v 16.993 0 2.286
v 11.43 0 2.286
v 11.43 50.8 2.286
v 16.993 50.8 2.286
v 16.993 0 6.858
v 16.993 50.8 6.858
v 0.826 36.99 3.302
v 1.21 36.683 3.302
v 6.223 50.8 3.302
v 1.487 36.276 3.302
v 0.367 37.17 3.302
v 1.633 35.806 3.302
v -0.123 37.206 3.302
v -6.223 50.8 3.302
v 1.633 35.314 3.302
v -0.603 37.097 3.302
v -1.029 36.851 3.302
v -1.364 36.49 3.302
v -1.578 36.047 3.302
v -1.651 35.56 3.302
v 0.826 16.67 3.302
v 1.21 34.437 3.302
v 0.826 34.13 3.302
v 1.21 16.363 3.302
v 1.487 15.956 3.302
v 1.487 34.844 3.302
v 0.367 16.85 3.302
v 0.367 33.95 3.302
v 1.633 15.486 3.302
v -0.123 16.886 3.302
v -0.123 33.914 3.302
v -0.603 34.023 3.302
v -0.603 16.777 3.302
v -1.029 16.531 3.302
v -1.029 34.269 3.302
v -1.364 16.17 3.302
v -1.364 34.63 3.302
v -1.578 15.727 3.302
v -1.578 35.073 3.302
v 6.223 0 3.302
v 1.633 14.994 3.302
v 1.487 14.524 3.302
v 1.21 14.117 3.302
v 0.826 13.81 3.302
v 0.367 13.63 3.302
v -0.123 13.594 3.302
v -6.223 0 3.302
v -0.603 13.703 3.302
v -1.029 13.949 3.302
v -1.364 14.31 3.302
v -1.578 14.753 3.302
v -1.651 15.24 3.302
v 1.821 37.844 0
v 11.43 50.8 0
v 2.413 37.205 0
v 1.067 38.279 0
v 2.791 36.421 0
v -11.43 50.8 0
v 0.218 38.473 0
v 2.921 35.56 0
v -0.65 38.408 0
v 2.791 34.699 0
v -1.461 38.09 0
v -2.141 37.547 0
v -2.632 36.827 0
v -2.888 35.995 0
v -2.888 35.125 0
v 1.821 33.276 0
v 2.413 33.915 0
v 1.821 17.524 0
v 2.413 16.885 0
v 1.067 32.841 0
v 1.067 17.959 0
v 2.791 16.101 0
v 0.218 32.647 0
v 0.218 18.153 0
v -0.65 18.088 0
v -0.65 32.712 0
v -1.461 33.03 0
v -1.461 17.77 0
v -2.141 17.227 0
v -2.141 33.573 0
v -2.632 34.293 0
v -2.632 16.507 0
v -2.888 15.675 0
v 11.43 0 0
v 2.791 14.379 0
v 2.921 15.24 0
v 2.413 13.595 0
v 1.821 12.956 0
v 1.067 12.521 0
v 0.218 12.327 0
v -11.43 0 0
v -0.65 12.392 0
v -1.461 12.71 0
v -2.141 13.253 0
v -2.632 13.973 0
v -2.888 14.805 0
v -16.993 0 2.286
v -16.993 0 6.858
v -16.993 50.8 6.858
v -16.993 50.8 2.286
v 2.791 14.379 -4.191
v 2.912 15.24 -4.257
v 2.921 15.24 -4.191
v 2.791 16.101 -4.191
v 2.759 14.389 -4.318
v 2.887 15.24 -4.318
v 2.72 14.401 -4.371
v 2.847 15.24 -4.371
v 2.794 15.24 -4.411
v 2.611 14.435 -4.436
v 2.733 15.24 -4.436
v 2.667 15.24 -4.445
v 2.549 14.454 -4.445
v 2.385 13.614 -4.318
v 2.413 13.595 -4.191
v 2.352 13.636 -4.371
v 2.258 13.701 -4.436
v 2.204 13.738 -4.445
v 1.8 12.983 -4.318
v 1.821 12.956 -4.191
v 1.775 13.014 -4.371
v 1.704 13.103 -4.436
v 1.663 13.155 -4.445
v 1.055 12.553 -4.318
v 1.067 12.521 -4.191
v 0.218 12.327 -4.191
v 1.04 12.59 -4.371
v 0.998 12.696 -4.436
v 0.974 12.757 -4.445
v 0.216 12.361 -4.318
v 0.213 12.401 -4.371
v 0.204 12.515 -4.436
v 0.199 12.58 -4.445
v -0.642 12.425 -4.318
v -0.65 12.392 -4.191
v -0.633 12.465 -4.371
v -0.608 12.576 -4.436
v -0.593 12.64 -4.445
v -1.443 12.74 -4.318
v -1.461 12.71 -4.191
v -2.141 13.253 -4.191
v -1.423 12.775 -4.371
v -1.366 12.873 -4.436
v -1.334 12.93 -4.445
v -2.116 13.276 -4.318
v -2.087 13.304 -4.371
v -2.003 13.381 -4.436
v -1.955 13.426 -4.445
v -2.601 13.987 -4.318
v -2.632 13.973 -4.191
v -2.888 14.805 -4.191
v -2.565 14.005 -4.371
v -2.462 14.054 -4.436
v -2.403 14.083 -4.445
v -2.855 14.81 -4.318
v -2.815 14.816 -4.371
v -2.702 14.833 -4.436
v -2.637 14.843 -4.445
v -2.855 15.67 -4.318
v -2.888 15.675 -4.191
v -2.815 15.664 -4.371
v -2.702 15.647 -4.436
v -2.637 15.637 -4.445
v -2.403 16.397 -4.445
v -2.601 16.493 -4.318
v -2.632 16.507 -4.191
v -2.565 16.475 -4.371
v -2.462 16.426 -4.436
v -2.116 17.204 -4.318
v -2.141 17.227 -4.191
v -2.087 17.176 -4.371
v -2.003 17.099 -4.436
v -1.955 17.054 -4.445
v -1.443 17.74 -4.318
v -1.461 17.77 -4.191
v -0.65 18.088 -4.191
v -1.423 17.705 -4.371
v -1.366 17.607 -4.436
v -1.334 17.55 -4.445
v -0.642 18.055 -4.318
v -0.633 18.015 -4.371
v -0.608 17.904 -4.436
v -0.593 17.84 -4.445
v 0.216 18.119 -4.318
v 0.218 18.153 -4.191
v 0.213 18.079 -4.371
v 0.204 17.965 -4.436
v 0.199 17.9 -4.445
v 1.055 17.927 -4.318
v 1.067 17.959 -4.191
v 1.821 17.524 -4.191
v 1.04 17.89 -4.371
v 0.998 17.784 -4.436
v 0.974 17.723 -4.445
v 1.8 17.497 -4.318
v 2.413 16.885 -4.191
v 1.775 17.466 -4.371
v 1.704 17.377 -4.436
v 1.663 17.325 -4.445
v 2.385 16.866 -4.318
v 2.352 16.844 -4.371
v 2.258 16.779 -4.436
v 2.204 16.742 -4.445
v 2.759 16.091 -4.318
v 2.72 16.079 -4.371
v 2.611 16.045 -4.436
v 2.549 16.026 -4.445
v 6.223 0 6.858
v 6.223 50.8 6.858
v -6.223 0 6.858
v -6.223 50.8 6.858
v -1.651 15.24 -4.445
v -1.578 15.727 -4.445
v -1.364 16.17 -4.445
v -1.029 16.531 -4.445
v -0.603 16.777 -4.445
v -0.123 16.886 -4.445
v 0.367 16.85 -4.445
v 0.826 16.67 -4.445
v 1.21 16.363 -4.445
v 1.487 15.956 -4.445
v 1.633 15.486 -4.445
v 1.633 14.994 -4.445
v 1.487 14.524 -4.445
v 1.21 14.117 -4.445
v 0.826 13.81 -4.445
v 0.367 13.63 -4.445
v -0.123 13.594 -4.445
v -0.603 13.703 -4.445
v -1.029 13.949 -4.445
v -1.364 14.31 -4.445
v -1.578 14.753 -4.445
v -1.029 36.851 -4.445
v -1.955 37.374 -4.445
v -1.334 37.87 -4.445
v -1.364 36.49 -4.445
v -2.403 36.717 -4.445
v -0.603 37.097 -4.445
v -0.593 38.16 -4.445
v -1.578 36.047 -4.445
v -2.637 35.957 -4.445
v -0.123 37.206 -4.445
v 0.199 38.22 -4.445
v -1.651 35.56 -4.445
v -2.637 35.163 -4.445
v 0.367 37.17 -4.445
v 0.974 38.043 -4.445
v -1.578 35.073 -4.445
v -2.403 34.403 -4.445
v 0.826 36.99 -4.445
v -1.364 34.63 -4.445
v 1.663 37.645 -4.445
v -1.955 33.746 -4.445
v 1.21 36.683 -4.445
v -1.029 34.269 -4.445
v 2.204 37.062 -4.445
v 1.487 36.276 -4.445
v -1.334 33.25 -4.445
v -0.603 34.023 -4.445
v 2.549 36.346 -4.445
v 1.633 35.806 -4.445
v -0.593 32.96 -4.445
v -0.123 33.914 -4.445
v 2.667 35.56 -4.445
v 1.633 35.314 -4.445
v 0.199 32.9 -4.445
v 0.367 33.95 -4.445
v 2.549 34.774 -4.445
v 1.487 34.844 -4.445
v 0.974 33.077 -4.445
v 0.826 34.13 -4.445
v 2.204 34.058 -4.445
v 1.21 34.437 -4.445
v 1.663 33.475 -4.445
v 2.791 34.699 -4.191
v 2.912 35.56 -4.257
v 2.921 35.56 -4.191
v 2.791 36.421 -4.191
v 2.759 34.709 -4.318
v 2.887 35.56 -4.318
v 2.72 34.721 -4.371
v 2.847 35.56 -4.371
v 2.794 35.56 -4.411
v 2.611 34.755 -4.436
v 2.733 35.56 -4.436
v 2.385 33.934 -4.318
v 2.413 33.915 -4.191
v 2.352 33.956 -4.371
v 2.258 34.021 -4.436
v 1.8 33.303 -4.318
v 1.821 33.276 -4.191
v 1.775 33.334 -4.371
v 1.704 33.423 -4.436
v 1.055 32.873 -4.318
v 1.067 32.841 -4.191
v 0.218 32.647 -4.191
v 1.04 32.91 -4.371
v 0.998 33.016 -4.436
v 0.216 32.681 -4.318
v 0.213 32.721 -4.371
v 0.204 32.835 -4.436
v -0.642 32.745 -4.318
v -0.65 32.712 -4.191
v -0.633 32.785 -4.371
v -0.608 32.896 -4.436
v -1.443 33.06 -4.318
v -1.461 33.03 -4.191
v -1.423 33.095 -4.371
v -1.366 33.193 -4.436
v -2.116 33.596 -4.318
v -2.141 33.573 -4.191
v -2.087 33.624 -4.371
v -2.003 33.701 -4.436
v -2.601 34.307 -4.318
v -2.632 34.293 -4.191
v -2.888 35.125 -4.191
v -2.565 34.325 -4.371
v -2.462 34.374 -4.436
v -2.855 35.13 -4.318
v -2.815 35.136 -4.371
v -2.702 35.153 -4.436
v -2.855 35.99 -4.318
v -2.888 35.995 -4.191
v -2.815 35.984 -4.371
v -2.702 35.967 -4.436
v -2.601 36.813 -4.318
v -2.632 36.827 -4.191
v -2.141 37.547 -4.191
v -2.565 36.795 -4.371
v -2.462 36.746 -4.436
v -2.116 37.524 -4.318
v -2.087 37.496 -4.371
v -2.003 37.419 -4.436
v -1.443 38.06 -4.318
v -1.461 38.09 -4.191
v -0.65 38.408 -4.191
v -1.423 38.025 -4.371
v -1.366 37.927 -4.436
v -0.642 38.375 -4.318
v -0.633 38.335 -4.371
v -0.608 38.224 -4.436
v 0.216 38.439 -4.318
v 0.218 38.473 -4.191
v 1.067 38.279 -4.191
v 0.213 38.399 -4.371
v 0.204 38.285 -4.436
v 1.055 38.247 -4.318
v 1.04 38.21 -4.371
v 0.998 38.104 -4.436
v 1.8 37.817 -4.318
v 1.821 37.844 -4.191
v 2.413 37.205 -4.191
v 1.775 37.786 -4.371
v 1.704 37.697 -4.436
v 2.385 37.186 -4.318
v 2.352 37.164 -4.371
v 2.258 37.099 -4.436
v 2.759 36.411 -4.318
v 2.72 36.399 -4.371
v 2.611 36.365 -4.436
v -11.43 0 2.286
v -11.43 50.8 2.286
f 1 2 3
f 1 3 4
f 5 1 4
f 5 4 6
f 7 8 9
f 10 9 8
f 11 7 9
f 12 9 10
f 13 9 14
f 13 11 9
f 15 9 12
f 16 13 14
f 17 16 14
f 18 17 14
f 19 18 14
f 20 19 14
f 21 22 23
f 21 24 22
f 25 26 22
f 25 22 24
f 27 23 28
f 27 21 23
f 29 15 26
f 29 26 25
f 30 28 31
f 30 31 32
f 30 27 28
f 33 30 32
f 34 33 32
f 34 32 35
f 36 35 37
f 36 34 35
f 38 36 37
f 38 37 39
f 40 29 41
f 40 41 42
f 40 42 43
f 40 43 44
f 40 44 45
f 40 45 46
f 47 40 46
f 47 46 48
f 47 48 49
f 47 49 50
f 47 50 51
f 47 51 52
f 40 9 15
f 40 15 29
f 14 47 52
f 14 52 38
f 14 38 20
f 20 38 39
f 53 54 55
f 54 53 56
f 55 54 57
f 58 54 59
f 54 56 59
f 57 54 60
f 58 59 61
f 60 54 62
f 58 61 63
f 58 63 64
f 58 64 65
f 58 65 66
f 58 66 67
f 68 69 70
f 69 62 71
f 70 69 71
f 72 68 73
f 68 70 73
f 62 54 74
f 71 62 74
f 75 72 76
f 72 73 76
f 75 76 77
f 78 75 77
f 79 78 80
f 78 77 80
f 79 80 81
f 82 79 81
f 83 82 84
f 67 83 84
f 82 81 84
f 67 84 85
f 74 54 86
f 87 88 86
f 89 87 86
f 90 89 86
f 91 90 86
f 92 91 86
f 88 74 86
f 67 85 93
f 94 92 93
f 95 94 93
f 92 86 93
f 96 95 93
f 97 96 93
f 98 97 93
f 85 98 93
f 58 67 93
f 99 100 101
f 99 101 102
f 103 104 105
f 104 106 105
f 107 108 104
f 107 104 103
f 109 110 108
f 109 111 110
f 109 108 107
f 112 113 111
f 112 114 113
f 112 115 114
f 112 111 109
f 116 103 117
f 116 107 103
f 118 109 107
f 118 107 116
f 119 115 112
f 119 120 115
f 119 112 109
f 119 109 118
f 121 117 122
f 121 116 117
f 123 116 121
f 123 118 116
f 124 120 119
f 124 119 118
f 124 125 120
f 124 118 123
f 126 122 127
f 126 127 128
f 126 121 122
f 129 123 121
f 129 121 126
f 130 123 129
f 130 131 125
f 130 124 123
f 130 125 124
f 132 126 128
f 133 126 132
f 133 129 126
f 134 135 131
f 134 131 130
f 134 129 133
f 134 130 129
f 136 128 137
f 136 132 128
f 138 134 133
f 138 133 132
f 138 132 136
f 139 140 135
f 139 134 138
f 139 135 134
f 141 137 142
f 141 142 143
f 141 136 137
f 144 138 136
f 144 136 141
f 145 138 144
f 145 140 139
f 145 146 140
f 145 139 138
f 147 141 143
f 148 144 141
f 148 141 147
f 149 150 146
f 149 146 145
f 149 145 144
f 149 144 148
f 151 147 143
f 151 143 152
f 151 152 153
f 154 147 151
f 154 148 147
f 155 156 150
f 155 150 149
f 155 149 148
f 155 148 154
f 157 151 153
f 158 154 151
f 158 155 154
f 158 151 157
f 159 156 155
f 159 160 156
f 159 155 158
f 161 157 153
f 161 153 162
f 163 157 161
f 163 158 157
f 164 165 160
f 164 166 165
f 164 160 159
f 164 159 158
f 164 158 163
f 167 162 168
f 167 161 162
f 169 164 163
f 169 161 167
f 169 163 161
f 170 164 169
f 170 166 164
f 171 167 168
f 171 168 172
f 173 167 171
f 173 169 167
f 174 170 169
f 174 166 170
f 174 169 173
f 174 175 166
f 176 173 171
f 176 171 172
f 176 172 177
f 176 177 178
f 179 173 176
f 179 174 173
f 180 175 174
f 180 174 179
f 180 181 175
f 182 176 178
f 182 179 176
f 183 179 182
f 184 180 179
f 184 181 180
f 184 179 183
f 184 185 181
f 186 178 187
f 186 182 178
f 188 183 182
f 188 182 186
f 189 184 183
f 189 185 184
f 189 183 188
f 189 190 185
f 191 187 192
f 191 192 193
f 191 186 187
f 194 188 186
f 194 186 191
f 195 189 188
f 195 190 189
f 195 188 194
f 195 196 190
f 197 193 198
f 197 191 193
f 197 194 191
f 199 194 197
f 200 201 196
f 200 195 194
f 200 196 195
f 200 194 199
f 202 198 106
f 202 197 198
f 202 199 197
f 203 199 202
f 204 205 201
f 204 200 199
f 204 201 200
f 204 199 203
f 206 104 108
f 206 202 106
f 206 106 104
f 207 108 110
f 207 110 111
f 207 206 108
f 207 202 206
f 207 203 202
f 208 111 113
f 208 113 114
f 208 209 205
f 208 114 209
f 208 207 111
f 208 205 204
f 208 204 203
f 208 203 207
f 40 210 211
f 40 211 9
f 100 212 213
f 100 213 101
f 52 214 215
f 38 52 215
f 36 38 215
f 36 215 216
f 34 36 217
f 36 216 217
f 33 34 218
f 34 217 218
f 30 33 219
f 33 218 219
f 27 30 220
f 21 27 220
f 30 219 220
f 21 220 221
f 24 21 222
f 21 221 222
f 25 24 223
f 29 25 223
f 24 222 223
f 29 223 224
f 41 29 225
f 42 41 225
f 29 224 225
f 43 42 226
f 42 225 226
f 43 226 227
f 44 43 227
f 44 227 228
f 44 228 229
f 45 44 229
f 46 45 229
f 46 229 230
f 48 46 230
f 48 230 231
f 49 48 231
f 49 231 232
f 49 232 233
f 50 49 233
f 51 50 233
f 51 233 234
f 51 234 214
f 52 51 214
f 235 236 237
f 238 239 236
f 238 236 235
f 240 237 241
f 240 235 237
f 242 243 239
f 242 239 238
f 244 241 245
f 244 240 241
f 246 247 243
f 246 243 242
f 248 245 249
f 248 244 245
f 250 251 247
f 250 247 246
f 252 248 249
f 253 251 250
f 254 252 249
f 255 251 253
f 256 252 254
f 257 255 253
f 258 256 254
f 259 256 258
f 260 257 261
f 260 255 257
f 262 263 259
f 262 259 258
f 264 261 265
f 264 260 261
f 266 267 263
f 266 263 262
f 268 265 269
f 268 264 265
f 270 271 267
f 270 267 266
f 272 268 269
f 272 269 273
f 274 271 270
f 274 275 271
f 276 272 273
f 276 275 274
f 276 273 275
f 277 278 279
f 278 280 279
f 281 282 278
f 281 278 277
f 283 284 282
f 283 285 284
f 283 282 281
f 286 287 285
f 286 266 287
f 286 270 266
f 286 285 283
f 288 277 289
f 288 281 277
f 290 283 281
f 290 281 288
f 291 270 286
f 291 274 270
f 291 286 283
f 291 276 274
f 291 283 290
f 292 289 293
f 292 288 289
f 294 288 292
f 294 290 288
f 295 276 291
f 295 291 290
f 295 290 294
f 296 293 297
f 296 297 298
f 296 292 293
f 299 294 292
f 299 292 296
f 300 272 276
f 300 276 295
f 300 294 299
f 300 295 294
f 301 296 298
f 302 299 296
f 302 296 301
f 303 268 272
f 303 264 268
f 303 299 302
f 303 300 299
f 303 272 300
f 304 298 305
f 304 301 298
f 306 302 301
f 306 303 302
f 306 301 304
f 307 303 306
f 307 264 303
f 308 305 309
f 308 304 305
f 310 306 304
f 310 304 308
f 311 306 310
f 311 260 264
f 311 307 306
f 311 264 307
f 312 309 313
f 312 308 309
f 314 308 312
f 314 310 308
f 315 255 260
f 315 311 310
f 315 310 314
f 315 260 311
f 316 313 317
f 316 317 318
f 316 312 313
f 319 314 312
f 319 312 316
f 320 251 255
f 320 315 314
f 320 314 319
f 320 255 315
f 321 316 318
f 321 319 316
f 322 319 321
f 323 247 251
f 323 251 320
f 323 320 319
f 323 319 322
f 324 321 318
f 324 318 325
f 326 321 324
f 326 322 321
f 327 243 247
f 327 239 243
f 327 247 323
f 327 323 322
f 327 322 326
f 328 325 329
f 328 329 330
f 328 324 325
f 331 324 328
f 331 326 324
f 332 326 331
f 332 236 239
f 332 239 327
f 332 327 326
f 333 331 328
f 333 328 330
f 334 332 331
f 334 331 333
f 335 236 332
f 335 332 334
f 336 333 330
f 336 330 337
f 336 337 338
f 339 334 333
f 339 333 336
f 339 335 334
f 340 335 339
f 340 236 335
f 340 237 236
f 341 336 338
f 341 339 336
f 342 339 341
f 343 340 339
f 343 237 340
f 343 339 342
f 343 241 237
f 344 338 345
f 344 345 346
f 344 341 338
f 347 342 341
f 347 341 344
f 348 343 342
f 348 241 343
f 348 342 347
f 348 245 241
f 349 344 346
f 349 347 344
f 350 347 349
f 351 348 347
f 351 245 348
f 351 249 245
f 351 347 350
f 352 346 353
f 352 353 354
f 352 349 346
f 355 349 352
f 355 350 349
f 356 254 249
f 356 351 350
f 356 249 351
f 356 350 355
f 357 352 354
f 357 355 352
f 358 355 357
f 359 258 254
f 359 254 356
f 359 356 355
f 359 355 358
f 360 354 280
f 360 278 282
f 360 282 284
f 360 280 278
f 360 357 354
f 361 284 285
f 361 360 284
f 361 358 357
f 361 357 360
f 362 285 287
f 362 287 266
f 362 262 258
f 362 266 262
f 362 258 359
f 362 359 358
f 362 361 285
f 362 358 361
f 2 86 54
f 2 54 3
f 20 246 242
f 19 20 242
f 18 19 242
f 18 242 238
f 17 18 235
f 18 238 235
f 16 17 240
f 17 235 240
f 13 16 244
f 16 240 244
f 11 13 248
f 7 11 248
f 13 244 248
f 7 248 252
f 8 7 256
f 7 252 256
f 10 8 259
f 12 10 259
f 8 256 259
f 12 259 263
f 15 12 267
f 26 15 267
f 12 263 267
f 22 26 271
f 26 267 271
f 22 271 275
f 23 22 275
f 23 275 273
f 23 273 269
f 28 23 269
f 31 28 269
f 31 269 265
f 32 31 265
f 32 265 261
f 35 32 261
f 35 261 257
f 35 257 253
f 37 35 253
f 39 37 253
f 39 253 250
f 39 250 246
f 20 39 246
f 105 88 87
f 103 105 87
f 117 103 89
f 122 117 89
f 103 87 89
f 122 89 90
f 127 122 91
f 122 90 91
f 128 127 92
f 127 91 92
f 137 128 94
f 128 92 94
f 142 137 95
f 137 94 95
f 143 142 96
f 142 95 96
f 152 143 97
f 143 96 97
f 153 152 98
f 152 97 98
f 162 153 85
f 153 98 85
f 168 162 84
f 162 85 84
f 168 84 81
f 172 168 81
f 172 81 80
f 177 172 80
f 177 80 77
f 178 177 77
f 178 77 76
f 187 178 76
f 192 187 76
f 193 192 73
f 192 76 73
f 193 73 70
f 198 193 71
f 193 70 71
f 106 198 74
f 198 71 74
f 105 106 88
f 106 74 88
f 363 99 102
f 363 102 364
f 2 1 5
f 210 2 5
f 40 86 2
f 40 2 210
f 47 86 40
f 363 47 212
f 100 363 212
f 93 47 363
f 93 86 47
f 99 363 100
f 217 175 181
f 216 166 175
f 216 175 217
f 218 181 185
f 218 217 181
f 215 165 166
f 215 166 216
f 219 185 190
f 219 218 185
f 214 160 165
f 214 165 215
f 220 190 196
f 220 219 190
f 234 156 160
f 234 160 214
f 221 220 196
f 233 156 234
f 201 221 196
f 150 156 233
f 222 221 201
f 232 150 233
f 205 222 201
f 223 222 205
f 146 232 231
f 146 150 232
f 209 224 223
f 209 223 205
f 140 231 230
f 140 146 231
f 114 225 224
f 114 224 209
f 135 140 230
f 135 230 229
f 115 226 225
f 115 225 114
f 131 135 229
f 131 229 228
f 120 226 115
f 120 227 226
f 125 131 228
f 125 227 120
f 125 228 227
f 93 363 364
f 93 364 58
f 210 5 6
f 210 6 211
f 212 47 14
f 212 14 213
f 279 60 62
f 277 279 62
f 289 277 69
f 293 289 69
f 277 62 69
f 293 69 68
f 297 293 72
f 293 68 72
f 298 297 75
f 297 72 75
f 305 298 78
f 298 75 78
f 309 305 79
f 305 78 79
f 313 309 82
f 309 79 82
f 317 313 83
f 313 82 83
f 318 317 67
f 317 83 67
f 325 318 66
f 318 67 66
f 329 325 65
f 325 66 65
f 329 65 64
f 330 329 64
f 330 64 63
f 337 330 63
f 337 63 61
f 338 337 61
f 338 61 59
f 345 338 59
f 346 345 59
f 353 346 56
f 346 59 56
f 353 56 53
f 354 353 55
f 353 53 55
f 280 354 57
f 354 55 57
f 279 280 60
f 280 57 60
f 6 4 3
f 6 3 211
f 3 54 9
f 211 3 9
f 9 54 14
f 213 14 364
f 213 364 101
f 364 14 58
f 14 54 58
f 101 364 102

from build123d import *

# Parameters (mm, degrees)
BOSS_EXTRUDE1_DEPTH = 50.8
SKETCH2_R           = 2.921
BOSS_EXTRUDE2_DEPTH = 4.445
FILLET1_R           = 0.254
SKETCH3_R           = 1.651
CUT_EXTRUDE1_DEPTH  = 55.746198624
SKETCH4_R           = 2.921
BOSS_EXTRUDE3_DEPTH = 4.445
FILLET2_R           = 0.254
SKETCH5_R           = 1.651
CUT_EXTRUDE2_DEPTH  = 55.746198624


with BuildPart() as part:
    # Sketch1 → Boss-Extrude1 (new body)
    with BuildSketch(Plane(origin=(0, 0, 0), x_dir=(1, 0, 0), z_dir=(0, 1, 0))):
        Polygon((0, 0), (11.43, 0), (11.43, -2.286), (16.9926, -2.286), (16.9926, -6.858), (6.223, -6.858), (6.223, -3.302), (-6.223, -3.302), (-6.223, -6.858), (-16.9926, -6.858), (-16.9926, -2.286), (-11.43, -2.286), (-11.43, 0), align=None)
    extrude(amount=BOSS_EXTRUDE1_DEPTH)

    # Sketch2 → Boss-Extrude2 (add)
    with BuildSketch(Plane(origin=(0, 0, 0), x_dir=(-1, 0, 0), z_dir=(0, 0, -1))):
        with Locations(Location((0, 15.24, 0), (0, 0, 180))):
            Circle(SKETCH2_R)
    extrude(amount=BOSS_EXTRUDE2_DEPTH)

    # Fillet1
    fillet1_edges = [part.edges().sort_by_distance(p)[0] for p in [
        (-2.921, 15.24, -4.445),
    ]]
    fillet(fillet1_edges, radius=FILLET1_R)

    # Sketch3 → Cut-Extrude1 (cut, through all)
    with BuildSketch(Plane(origin=(0, 0, -4.445), x_dir=(-1, 0, 0), z_dir=(0, 0, -1))):
        with Locations((0, 15.24)):
            Circle(SKETCH3_R)
    extrude(amount=-CUT_EXTRUDE1_DEPTH, mode=Mode.SUBTRACT)

    # Sketch4 → Boss-Extrude3 (add)
    with BuildSketch(Plane(origin=(0, 0, 0), x_dir=(-1, 0, 0), z_dir=(0, 0, -1))):
        with Locations(Location((0, 35.56, 0), (0, 0, 180))):
            Circle(SKETCH4_R)
    extrude(amount=BOSS_EXTRUDE3_DEPTH)

    # Fillet2
    fillet2_edges = [part.edges().sort_by_distance(p)[0] for p in [
        (-2.921, 35.56, -4.445),
    ]]
    fillet(fillet2_edges, radius=FILLET2_R)

    # Sketch5 → Cut-Extrude2 (cut, through all)
    with BuildSketch(Plane(origin=(0, 0, -4.445), x_dir=(-1, 0, 0), z_dir=(0, 0, -1))):
        with Locations((0, 35.56)):
            Circle(SKETCH5_R)
    extrude(amount=-CUT_EXTRUDE2_DEPTH, mode=Mode.SUBTRACT)


solid = part.part
